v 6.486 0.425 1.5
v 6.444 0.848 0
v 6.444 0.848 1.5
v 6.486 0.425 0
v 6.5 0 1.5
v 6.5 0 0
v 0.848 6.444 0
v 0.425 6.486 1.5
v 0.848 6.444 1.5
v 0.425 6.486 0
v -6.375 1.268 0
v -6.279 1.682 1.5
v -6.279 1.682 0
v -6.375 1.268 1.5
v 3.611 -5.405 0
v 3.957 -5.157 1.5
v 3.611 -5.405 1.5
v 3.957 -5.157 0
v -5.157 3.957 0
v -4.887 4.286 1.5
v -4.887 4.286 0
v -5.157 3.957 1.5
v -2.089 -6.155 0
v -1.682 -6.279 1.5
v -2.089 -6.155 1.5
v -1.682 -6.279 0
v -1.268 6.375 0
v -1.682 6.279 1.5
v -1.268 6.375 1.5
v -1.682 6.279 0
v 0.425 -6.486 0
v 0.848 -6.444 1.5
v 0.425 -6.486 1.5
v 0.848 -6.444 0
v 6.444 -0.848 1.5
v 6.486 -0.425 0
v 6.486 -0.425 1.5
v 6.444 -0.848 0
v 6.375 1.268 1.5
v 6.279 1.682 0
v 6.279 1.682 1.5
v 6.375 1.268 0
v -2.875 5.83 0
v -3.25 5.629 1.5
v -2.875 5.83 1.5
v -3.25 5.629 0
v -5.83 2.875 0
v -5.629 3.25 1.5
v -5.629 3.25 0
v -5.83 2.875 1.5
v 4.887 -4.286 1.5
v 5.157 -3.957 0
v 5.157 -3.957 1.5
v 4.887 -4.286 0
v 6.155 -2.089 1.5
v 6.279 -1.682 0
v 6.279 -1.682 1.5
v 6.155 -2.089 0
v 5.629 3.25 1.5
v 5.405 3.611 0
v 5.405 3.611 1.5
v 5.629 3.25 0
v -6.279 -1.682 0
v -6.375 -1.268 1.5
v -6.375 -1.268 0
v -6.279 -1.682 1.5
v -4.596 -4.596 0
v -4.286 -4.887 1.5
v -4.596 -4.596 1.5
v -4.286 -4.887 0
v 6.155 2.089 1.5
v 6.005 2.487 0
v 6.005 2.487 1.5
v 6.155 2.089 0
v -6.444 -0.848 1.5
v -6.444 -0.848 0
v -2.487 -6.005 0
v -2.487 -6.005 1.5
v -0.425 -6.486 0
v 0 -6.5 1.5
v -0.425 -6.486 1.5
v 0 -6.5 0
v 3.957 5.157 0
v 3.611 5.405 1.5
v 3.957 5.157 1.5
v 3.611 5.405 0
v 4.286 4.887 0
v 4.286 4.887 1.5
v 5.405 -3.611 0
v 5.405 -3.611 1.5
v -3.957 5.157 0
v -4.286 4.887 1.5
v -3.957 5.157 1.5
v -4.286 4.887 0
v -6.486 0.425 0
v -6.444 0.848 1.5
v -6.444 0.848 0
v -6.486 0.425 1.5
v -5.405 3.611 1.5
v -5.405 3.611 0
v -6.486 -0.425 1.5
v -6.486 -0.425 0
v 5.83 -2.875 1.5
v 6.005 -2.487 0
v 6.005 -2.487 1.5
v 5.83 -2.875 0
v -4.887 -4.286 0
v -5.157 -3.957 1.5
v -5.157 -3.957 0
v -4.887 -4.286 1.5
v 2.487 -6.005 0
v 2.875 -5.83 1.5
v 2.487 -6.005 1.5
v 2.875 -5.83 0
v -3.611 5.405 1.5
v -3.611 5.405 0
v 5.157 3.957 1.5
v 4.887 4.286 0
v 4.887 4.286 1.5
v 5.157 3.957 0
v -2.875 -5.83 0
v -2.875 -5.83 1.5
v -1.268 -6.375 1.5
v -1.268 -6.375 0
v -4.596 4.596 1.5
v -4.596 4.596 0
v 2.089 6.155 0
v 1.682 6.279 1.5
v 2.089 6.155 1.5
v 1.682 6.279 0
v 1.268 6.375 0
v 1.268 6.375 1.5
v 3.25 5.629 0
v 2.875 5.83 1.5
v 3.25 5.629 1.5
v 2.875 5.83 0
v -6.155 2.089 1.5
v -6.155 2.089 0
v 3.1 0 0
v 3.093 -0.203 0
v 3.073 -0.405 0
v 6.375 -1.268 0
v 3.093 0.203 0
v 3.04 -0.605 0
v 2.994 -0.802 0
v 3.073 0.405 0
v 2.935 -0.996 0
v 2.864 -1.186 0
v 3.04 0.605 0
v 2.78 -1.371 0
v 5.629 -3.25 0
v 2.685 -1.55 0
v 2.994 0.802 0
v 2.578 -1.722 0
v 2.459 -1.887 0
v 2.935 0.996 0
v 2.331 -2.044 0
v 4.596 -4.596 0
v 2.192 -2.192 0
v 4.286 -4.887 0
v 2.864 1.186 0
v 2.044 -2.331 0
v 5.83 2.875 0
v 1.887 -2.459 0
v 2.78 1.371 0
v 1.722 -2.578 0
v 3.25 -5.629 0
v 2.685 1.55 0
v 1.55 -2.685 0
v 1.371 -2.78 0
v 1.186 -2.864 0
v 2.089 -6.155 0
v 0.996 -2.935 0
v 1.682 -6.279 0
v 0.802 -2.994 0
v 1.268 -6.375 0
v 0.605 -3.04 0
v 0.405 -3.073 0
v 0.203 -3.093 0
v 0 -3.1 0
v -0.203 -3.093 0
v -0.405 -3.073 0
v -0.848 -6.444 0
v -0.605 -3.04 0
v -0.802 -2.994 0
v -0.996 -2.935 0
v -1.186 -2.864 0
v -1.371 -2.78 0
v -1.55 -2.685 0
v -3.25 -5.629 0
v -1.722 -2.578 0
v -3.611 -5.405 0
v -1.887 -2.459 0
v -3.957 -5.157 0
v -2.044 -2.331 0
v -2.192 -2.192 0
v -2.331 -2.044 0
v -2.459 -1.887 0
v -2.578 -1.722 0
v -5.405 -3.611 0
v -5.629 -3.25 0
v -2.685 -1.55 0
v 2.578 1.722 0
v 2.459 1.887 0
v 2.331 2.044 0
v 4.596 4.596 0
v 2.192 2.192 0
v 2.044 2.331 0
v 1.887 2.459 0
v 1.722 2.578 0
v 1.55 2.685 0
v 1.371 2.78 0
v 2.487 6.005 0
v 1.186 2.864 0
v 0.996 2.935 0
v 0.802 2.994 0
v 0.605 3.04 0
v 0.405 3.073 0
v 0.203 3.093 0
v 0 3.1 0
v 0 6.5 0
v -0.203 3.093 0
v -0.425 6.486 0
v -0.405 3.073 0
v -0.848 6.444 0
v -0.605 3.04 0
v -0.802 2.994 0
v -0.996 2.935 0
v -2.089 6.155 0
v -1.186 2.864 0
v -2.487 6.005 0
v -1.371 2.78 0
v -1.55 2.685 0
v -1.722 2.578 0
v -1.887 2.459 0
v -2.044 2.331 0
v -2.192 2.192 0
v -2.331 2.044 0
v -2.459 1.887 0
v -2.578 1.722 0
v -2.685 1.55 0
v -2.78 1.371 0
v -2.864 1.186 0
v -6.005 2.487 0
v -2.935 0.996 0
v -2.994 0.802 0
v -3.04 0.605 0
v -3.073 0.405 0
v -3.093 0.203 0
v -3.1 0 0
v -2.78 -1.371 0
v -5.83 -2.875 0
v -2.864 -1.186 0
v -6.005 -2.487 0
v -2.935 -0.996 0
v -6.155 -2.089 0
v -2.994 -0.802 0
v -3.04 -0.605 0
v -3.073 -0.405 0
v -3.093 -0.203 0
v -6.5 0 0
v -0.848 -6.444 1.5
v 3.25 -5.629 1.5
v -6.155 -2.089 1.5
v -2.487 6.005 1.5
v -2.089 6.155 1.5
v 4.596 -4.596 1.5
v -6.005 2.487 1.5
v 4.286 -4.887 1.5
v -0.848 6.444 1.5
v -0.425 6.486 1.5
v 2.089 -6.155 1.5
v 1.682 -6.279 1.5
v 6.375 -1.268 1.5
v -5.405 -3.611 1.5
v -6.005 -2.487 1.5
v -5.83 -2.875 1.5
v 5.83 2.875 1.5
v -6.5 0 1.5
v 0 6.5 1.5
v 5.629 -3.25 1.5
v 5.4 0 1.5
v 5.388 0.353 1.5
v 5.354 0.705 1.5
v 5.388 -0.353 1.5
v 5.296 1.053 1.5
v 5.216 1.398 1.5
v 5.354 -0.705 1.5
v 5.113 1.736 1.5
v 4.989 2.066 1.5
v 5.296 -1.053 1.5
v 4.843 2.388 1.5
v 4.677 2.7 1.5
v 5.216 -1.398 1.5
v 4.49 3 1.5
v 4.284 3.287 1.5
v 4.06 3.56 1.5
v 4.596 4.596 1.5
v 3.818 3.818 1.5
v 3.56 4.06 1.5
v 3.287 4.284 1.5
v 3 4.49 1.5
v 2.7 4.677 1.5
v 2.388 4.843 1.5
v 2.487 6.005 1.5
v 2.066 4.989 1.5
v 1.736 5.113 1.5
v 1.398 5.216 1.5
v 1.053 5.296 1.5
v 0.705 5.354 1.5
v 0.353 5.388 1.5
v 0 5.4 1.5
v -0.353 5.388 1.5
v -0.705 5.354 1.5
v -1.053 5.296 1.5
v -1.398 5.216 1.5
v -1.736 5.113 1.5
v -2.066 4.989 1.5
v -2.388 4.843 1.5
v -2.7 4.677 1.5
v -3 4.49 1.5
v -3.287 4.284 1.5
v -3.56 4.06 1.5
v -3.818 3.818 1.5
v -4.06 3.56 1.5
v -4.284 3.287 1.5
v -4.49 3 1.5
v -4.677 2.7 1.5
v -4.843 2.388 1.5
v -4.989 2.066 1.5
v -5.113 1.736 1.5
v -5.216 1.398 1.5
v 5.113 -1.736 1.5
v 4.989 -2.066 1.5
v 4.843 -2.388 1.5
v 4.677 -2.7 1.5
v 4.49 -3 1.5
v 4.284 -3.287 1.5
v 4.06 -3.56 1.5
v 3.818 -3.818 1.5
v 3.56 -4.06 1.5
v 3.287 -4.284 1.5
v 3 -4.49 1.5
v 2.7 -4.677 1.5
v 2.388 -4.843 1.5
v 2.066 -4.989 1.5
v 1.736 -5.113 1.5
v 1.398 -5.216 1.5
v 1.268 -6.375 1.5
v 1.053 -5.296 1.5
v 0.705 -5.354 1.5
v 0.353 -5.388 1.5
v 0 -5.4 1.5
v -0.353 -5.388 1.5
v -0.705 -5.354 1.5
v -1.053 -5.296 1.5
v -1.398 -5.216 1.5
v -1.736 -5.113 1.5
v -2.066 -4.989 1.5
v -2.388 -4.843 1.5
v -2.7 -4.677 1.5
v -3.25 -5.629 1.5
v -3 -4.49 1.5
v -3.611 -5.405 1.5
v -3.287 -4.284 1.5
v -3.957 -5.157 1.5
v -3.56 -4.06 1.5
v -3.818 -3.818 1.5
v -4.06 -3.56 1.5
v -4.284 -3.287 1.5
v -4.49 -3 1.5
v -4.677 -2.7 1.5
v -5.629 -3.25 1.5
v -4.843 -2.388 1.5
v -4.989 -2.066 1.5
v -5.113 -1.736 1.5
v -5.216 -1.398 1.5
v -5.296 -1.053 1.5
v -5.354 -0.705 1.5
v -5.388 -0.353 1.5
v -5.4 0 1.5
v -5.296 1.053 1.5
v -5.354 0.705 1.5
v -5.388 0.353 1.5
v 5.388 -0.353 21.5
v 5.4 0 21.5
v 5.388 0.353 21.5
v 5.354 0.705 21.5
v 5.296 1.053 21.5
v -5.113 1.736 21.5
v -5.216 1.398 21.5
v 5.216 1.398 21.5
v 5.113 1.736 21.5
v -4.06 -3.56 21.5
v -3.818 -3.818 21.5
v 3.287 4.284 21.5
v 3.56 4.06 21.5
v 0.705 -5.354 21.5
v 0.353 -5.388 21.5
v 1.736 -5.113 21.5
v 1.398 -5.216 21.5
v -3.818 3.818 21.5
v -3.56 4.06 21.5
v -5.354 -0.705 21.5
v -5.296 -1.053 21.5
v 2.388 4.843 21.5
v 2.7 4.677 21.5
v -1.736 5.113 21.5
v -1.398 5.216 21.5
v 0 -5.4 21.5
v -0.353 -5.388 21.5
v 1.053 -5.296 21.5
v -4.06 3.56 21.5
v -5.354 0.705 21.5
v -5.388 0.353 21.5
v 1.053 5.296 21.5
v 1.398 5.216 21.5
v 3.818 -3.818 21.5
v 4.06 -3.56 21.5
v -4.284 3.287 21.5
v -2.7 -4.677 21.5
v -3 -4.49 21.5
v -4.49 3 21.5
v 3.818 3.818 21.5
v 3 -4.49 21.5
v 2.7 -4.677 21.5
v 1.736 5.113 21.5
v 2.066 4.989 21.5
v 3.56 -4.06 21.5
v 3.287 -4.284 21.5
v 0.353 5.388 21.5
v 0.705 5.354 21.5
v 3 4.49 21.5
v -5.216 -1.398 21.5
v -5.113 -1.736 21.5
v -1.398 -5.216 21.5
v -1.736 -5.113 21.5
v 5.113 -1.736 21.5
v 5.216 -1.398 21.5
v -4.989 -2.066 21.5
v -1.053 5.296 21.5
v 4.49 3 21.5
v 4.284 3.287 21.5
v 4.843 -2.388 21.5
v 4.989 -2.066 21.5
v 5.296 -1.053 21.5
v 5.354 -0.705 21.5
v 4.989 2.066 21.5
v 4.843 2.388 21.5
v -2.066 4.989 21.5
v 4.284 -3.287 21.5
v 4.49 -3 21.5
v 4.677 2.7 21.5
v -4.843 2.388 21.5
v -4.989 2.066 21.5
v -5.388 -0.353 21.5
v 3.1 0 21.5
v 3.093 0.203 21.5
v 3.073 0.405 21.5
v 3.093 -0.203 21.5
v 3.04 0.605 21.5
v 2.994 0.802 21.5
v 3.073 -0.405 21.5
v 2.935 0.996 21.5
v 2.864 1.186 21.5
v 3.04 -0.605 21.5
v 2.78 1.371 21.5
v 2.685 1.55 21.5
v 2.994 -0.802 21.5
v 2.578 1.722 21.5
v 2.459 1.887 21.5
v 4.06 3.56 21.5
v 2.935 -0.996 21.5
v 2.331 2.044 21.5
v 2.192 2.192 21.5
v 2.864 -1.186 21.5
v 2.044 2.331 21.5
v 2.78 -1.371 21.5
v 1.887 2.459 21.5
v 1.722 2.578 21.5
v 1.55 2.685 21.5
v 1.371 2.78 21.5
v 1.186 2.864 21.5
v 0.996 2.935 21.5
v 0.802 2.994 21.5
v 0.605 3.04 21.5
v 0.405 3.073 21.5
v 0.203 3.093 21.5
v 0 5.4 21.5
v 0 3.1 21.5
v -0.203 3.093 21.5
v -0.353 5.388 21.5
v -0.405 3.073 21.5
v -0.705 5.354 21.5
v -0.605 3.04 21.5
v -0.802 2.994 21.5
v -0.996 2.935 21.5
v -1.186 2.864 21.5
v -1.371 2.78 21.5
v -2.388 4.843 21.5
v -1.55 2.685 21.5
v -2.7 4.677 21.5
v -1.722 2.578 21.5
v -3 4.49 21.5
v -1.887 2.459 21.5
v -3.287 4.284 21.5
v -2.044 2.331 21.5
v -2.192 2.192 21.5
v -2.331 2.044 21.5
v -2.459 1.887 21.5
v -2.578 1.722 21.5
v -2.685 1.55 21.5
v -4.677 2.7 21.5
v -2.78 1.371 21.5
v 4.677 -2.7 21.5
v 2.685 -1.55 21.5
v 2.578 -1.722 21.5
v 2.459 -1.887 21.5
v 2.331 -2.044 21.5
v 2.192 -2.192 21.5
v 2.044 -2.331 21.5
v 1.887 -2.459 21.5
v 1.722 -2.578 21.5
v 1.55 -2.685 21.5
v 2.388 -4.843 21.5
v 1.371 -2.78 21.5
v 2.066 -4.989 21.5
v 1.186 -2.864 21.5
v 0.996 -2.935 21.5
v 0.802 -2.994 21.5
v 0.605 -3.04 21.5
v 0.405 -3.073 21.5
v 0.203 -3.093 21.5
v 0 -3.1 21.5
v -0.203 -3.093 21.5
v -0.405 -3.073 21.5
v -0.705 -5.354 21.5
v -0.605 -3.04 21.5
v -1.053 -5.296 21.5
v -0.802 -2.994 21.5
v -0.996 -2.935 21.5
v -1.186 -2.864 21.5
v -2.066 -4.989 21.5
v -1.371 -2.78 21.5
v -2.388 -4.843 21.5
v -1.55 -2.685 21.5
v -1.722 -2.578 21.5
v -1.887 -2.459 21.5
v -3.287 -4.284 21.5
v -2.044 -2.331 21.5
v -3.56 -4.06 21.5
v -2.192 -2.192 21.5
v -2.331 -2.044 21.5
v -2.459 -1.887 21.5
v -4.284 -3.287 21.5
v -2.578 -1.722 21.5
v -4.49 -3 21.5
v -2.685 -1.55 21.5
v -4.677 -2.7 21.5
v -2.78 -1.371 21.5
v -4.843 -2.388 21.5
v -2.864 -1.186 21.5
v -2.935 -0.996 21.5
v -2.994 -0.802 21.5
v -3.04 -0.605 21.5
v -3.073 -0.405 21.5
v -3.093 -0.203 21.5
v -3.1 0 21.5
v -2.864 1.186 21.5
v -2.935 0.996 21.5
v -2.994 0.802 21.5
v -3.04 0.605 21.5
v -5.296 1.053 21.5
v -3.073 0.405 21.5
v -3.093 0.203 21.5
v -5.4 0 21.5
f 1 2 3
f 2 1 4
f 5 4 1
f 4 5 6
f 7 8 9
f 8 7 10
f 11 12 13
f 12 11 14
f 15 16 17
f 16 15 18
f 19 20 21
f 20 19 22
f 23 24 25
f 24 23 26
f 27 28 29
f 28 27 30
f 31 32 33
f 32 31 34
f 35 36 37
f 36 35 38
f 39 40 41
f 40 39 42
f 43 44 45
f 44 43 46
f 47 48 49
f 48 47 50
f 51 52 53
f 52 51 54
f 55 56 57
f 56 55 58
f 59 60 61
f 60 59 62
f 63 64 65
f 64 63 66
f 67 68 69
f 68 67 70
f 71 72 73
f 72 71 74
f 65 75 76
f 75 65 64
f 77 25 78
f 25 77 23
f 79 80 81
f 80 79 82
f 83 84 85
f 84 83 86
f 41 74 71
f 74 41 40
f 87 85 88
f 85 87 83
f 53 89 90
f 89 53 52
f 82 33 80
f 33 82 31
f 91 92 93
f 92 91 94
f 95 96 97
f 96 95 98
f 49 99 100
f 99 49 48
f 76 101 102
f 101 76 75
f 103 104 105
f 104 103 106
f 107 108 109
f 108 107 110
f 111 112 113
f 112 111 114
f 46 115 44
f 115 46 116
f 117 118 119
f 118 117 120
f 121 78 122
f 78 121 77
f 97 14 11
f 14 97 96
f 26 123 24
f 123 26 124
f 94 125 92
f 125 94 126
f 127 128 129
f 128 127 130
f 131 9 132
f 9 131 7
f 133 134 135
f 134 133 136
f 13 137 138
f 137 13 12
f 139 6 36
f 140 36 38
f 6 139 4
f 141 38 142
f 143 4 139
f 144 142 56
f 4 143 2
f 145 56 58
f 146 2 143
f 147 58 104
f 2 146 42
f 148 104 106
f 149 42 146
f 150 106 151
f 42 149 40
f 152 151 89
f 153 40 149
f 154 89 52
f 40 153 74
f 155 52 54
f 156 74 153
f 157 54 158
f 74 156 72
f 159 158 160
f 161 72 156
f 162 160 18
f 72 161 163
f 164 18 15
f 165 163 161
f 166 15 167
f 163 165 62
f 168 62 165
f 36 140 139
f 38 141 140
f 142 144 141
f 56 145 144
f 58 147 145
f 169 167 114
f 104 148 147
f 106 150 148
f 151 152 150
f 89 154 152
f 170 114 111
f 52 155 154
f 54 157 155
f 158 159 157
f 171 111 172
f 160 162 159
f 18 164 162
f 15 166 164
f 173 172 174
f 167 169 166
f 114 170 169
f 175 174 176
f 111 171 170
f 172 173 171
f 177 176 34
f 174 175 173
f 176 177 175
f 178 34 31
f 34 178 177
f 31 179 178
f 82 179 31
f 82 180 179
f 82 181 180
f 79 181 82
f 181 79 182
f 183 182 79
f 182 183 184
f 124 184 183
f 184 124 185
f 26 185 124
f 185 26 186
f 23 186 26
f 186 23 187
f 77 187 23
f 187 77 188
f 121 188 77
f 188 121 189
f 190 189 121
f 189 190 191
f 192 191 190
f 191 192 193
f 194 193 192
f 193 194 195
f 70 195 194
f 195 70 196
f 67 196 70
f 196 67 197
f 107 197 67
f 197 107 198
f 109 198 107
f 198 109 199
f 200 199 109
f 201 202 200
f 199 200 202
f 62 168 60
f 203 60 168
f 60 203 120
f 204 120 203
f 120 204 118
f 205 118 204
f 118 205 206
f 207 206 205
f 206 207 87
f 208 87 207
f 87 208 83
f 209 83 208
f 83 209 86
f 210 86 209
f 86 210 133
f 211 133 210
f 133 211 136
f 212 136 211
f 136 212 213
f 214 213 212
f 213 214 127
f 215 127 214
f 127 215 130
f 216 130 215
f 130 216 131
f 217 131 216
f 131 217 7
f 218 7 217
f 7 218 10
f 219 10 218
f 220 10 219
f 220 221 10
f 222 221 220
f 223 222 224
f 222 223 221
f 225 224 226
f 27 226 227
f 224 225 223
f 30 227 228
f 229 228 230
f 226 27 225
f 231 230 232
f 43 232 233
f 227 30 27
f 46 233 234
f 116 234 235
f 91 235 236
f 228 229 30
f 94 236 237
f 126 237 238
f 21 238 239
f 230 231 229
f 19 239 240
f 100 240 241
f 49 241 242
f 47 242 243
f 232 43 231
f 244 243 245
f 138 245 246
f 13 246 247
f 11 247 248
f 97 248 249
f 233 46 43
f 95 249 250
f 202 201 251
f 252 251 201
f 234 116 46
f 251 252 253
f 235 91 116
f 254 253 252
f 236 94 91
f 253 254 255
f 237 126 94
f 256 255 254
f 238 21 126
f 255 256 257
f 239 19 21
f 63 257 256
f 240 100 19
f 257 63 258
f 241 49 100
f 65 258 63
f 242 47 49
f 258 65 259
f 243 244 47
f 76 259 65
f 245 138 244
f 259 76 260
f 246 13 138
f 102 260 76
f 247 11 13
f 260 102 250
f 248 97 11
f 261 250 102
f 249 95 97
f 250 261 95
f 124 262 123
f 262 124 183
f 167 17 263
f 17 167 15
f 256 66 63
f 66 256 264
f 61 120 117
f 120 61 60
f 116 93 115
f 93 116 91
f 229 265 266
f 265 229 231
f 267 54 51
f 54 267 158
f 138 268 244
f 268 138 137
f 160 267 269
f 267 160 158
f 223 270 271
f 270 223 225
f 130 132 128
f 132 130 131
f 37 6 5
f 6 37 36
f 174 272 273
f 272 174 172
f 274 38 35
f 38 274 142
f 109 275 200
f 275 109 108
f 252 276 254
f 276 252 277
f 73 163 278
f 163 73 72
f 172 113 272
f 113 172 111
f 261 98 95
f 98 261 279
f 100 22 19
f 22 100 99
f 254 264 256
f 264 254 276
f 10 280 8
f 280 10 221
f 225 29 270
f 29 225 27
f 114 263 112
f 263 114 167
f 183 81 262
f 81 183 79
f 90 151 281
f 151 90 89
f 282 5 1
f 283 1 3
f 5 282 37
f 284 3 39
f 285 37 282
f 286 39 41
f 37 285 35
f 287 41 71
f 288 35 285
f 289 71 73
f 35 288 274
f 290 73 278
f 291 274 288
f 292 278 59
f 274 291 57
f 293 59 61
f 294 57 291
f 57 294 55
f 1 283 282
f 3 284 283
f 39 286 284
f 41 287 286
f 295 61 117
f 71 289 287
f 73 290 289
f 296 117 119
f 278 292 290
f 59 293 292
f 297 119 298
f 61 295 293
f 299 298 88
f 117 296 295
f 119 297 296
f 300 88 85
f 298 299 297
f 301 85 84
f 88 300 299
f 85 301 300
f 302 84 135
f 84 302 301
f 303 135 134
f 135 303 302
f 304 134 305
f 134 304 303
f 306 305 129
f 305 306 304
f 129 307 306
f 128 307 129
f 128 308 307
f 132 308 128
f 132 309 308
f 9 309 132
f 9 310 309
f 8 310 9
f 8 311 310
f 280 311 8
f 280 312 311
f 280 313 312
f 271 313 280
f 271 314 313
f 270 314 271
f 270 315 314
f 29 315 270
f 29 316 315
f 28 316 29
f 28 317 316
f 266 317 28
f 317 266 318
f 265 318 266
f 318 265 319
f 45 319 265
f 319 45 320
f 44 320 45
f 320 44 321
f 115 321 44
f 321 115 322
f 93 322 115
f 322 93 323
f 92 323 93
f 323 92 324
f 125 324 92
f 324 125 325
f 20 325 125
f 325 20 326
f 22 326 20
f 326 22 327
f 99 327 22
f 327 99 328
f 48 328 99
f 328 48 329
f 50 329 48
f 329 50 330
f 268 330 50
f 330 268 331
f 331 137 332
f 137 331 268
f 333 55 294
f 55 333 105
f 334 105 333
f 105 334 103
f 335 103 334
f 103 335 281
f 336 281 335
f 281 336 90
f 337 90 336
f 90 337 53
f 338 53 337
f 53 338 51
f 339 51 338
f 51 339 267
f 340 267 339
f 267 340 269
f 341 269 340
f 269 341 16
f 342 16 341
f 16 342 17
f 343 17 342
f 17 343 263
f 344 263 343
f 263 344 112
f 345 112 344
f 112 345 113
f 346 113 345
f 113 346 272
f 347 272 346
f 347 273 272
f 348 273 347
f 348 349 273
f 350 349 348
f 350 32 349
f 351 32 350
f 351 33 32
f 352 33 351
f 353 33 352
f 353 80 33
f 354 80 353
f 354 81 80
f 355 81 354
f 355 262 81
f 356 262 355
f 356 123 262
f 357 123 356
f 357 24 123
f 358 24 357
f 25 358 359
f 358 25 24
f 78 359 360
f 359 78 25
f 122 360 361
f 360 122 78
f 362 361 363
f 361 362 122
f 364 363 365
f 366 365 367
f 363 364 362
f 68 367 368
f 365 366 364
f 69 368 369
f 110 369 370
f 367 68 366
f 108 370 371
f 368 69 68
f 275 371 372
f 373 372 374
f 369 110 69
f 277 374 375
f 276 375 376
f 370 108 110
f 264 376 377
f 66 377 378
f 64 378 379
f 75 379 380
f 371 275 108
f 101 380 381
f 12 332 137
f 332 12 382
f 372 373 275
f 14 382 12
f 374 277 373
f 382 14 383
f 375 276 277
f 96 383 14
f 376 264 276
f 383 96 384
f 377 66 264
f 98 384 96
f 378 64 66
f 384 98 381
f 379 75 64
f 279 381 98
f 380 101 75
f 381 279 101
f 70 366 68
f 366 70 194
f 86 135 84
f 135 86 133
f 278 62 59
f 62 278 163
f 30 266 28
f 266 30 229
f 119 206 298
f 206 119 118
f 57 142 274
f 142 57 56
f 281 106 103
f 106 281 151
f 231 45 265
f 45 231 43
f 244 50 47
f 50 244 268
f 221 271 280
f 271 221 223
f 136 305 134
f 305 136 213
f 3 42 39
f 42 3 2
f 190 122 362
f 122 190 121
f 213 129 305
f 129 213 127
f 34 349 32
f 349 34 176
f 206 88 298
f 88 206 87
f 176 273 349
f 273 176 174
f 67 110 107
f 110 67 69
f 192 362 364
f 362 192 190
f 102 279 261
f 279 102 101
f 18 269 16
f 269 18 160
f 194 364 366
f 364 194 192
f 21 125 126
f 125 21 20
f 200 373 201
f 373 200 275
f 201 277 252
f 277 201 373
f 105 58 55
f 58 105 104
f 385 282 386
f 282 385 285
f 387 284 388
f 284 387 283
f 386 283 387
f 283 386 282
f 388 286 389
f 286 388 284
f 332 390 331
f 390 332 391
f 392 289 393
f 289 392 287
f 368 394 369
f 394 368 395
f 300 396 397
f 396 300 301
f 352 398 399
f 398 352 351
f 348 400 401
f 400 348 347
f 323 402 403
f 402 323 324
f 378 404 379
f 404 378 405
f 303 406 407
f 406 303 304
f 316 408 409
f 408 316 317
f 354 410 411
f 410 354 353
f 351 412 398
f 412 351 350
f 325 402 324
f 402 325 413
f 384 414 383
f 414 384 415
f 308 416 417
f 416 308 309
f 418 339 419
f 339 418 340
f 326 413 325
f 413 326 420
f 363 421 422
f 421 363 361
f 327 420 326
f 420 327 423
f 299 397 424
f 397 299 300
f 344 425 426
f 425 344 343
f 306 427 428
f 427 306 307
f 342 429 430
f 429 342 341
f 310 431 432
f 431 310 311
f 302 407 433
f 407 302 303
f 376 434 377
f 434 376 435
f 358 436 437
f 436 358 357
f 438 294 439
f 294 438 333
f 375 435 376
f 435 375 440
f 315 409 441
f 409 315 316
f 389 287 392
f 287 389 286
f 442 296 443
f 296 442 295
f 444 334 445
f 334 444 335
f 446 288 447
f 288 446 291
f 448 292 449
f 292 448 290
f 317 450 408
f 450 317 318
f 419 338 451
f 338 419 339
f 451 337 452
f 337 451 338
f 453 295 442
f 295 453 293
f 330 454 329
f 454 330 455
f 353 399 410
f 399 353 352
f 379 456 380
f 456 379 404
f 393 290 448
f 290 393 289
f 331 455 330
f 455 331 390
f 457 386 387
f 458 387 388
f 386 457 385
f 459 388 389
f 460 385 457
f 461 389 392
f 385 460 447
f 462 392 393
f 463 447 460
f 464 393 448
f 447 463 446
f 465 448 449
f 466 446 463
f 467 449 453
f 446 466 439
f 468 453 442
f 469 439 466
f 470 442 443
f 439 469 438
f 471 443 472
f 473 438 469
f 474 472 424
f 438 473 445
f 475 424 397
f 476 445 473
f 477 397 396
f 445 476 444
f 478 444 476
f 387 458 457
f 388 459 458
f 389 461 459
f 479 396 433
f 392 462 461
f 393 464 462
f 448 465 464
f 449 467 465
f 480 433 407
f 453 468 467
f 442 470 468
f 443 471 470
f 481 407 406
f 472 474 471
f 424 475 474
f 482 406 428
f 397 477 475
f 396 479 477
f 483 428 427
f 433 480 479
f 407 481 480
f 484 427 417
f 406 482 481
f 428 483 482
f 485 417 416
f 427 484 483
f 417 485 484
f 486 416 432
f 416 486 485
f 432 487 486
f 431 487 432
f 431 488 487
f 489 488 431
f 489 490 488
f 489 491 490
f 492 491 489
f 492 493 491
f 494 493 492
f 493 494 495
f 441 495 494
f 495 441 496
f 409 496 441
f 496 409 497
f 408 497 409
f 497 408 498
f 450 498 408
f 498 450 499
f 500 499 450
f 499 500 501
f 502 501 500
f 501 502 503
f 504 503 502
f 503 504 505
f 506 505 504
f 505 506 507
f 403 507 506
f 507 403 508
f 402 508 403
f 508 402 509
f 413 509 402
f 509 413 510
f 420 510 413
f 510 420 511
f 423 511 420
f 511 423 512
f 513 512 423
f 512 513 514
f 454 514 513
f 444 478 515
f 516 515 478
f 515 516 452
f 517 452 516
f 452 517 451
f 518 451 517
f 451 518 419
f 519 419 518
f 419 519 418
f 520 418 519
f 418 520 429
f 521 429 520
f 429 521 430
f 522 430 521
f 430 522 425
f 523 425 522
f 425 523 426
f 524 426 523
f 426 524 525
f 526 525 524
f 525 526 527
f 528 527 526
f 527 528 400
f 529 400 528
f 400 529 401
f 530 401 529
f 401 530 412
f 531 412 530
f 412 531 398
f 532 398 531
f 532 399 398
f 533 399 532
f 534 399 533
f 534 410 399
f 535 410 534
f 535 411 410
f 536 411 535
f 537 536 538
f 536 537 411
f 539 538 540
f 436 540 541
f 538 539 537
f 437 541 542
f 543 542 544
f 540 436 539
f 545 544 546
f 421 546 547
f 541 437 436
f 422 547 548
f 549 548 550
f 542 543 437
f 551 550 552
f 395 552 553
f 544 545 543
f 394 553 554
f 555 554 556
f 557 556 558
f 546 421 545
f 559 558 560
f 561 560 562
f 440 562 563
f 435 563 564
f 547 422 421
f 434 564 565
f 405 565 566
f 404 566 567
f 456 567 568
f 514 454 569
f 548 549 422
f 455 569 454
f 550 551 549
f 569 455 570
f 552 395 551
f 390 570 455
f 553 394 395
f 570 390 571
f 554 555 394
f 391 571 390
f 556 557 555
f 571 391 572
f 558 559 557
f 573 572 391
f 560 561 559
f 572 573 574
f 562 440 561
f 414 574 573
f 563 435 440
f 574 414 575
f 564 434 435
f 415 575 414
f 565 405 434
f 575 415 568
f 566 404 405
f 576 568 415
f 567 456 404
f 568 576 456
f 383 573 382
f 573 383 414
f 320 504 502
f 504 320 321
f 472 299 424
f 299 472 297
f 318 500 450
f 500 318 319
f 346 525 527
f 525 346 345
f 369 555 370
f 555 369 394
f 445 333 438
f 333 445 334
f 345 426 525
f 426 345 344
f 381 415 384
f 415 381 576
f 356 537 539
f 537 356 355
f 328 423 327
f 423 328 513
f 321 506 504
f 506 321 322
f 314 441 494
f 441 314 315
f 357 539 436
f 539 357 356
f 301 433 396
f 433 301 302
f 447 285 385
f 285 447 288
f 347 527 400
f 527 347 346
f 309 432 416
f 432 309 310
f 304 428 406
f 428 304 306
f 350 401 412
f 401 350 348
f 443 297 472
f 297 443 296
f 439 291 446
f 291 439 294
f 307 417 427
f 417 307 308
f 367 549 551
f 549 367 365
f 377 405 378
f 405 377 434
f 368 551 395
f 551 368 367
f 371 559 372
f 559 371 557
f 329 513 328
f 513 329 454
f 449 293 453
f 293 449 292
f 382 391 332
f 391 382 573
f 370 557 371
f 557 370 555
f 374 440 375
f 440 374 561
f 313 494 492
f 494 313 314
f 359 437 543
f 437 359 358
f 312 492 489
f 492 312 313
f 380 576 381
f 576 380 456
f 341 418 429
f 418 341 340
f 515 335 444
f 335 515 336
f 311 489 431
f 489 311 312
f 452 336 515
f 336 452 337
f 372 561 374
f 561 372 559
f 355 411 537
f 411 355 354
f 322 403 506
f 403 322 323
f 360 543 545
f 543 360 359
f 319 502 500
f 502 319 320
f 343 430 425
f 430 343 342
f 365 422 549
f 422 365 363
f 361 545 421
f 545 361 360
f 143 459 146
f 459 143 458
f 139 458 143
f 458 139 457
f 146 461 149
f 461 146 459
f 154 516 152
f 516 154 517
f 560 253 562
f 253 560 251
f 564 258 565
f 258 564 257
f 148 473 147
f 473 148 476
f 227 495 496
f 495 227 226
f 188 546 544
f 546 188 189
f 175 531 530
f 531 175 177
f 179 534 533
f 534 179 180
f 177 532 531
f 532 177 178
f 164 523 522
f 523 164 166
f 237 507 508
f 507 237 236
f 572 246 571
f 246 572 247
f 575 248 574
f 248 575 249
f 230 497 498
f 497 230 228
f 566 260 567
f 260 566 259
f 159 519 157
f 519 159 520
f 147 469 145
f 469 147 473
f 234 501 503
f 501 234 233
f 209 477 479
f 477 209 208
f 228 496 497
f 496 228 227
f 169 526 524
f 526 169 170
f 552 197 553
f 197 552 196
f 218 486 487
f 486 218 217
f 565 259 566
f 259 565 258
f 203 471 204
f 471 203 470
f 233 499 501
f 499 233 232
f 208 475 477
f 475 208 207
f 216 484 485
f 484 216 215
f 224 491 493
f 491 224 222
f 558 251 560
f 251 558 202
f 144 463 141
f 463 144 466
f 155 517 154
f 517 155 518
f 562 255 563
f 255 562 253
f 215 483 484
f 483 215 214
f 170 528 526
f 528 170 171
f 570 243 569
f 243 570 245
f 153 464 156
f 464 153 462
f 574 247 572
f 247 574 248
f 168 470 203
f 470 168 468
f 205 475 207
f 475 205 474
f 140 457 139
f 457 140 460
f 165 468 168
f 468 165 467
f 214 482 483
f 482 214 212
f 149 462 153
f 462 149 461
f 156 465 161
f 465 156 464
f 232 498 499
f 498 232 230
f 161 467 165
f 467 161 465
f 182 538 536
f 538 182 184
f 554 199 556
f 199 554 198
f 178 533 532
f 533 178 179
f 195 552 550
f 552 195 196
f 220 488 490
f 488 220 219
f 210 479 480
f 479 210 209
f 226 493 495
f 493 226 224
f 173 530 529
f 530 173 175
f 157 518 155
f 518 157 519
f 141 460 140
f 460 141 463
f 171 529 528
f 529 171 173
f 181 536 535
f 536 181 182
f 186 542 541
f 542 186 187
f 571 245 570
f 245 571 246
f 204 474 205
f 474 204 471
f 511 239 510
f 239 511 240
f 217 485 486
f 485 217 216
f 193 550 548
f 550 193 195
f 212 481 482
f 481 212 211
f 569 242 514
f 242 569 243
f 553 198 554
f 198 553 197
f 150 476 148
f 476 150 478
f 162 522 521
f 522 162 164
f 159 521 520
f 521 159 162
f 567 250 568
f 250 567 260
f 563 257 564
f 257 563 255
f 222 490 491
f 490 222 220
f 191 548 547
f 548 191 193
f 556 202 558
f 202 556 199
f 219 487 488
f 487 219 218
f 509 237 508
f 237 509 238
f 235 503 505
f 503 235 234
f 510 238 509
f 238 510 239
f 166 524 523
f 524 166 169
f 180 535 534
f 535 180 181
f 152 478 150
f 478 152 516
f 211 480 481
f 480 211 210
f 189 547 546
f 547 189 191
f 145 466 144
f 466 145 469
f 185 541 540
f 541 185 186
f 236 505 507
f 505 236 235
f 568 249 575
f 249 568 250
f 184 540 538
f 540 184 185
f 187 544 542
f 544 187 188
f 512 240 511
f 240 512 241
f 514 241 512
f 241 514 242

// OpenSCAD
// PCR tube adapter sleeve: fits a 0.2 mL tube into a 1.5 mL rack hole
// Print orientation: collar on the bed, sleeve body rising upward

$fn = 96;

// --- Dimensions (mm) ---
collar_d      = 13;    // collar outer diameter
collar_h      = 1.5;   // collar thickness (z = 0 to 1.5)
sleeve_od     = 10.8;  // sleeve body outer diameter
sleeve_top_z  = 21.5;  // top of sleeve body (z)
bore_d        = 6.2;   // through-bore diameter
eps           = 0.5;   // cutter overshoot past faces

total_h = sleeve_top_z; // overall height (21.5 mm)

difference() {
    union() {
        // Collar (z = 0 to 1.5)
        cylinder(d = collar_d, h = collar_h);
        // Sleeve body (z = 1.5 to 21.5), slightly overlapping the collar for a clean union
        translate([0, 0, collar_h - 0.01])
            cylinder(d = sleeve_od, h = total_h - collar_h + 0.01);
    }
    // Through-bore, extends past both end faces
    translate([0, 0, -eps])
        cylinder(d = bore_d, h = total_h + 2 * eps);
}
